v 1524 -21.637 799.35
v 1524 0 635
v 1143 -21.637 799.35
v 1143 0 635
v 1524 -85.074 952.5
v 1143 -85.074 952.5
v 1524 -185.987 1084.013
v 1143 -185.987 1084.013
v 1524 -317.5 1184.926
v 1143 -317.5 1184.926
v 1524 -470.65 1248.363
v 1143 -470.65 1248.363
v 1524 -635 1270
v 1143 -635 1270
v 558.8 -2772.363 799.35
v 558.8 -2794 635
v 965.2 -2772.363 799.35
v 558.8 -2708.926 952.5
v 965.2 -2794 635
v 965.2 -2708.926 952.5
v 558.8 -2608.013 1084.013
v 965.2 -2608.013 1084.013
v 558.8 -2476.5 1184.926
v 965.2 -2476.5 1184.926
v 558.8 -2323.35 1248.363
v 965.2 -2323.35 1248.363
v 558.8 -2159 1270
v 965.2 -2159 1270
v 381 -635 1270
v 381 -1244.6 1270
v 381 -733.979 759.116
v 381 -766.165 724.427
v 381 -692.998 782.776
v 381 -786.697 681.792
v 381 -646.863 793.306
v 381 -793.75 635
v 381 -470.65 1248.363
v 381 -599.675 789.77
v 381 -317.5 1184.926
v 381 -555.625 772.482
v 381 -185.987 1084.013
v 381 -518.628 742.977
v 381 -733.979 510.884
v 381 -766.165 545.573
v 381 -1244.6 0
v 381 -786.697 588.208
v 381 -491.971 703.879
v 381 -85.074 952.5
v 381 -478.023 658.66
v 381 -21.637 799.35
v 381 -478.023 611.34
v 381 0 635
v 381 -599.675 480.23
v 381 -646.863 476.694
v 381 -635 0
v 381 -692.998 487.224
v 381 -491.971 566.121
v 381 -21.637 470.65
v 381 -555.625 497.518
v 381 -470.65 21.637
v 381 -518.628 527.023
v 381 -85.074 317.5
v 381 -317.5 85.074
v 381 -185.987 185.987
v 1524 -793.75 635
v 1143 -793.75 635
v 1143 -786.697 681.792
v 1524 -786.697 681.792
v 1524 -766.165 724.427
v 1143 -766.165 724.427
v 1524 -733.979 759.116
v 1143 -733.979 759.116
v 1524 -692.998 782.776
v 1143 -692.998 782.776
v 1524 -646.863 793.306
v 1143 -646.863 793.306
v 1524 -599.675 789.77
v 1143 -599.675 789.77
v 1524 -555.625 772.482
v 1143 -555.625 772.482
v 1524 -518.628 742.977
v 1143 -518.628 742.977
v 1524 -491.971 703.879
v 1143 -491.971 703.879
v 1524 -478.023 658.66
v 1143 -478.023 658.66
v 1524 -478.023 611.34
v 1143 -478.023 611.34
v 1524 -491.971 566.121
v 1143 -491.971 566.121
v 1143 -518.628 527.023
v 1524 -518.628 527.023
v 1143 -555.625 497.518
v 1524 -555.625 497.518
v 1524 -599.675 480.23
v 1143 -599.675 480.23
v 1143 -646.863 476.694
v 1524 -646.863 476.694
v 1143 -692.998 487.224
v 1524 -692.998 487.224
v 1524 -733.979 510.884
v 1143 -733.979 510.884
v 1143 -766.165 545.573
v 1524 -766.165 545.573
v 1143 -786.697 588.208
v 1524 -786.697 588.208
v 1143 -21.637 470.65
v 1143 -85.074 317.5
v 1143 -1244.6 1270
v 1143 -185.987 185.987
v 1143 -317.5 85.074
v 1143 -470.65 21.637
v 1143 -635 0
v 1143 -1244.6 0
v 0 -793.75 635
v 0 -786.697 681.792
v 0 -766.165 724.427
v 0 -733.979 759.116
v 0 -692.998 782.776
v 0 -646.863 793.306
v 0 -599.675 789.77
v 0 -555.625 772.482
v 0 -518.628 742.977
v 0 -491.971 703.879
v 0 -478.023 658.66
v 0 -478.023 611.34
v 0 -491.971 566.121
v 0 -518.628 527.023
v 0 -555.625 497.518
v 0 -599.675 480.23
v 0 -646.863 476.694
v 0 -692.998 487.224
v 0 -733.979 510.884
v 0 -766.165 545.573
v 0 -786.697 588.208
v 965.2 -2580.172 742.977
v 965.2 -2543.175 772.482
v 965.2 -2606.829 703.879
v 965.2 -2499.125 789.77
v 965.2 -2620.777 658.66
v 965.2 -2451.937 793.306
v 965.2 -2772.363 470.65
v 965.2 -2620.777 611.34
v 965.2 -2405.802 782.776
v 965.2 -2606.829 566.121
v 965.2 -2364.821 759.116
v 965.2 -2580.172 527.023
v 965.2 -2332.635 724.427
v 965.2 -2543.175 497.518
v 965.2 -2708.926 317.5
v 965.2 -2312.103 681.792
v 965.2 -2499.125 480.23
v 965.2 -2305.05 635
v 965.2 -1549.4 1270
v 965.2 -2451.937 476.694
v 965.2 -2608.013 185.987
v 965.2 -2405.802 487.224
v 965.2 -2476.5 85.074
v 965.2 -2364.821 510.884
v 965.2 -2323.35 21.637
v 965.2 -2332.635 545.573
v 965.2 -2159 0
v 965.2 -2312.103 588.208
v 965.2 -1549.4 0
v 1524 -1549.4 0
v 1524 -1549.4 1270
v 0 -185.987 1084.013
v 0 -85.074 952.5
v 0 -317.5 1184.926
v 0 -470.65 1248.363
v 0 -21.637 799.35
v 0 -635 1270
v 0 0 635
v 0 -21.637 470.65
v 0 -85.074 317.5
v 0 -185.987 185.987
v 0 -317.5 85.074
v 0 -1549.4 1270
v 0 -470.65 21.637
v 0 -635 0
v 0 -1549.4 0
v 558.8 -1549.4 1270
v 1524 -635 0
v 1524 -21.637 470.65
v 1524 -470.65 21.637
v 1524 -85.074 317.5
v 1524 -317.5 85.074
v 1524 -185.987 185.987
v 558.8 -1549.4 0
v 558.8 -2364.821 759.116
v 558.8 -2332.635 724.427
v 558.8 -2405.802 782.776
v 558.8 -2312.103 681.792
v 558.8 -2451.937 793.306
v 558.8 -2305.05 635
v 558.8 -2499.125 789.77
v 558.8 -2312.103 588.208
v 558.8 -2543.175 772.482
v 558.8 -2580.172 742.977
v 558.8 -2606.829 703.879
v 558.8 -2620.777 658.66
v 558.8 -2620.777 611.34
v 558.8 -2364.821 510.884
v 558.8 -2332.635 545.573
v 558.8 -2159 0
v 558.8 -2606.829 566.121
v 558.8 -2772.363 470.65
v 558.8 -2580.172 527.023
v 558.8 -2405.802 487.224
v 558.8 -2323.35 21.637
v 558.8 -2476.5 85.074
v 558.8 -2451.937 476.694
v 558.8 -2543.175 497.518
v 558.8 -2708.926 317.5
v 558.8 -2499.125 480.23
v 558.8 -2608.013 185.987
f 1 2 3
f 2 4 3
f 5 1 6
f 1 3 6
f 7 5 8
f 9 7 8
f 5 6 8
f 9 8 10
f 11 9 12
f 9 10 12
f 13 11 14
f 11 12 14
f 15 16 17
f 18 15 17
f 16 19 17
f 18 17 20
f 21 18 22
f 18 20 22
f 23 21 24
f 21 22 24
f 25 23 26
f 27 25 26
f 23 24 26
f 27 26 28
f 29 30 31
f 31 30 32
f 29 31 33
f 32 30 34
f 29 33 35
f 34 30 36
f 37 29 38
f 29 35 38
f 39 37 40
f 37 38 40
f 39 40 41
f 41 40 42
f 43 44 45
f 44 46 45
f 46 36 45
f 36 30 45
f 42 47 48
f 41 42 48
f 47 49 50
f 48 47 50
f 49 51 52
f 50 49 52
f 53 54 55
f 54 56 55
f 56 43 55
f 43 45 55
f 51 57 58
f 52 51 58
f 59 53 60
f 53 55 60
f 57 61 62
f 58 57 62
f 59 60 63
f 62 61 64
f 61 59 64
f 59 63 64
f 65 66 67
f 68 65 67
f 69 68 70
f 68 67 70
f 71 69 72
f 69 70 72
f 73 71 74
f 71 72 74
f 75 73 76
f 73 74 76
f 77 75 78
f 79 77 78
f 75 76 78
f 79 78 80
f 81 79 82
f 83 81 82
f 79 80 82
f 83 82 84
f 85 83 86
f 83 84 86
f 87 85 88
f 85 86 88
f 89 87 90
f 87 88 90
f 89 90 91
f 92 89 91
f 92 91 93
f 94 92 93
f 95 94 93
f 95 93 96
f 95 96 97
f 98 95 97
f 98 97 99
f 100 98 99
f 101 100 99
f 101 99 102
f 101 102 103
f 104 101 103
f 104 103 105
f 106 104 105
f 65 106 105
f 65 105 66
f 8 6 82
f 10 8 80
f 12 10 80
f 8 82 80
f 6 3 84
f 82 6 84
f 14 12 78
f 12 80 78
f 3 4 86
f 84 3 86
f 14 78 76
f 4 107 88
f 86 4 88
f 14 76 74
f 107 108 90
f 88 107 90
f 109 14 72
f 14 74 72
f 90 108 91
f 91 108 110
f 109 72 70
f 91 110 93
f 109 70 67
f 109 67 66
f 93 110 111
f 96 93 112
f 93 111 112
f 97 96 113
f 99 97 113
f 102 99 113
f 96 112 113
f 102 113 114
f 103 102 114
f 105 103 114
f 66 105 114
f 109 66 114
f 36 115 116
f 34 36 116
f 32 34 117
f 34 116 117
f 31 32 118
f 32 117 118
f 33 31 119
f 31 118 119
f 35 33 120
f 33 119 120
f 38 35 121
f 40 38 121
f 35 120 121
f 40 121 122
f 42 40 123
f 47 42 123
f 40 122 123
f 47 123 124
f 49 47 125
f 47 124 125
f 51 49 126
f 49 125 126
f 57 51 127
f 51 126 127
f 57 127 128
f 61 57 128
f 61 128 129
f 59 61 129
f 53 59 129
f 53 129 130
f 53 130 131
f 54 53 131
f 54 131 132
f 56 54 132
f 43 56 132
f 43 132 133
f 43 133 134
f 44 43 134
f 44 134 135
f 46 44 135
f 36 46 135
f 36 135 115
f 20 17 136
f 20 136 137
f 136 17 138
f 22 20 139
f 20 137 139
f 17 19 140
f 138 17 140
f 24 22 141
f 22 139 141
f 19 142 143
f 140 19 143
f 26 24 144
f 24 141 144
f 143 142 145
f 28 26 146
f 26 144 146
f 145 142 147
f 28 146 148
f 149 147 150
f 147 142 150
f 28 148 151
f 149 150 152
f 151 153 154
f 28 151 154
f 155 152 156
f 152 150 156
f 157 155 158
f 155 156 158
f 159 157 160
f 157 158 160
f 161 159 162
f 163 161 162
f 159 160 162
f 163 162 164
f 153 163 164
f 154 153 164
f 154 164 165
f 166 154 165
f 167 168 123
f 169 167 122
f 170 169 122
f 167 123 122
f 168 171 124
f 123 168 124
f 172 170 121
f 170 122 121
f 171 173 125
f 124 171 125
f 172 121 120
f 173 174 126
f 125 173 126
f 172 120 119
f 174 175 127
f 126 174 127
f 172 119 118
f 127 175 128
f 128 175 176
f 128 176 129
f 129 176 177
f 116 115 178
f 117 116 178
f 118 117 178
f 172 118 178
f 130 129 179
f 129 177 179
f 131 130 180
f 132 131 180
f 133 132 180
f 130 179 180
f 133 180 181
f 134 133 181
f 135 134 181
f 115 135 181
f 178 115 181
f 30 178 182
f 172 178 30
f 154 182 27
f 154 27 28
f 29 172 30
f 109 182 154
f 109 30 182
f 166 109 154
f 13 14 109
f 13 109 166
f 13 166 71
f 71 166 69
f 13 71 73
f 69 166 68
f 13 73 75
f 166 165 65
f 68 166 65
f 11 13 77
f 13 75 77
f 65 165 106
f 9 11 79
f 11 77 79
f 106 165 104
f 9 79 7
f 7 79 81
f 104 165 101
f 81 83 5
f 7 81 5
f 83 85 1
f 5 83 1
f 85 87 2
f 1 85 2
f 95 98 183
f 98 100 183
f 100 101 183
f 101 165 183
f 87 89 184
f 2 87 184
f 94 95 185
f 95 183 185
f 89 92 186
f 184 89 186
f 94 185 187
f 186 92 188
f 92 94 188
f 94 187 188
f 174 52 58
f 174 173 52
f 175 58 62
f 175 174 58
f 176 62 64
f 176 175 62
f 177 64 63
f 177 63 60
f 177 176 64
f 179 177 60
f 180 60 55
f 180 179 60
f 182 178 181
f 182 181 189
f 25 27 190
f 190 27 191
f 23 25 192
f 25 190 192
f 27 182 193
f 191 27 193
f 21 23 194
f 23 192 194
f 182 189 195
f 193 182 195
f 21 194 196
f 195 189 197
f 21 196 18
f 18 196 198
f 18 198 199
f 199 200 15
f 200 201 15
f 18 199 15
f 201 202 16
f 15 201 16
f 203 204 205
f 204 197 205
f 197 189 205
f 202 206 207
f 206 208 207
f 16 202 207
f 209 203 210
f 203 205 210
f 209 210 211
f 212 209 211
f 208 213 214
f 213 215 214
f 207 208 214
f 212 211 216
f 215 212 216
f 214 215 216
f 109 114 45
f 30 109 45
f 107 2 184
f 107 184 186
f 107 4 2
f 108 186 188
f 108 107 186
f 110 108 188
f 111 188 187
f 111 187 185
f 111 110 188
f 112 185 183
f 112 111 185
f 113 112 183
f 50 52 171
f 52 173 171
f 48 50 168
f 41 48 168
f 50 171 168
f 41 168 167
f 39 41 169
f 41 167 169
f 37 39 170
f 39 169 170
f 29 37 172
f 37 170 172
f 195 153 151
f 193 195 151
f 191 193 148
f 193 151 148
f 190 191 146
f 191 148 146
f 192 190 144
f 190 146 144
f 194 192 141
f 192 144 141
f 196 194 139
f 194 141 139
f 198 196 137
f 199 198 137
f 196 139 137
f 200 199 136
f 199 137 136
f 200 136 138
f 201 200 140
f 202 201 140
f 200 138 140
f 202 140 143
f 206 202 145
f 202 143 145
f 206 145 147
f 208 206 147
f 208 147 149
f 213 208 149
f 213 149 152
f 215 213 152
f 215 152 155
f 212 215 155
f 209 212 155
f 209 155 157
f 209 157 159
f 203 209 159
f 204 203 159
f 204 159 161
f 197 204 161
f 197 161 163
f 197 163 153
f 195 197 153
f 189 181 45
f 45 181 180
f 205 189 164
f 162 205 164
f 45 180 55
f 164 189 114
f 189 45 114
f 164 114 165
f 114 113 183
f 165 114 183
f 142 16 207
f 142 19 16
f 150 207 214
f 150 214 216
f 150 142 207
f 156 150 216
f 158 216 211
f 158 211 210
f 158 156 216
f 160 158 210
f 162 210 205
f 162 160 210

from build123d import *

# Parameters (mm, degrees)
F1_DEPTH = 1270
F2_R     = 634.99999
F4_D     = 317.5
F6_D     = 317.5


# Not quite as in the source:
# - a fillet or chamfer is up to 0.001 mm smaller than in the source, because OpenCascade refuses the exact size


with BuildPart() as f1:
    # F0 (on Top) → F1 (new body)
    with BuildSketch(Plane.XY):
        Polygon((381, 0), (0, 0), (0, -1549.4), (558.8, -1549.4), (558.8, -2794), (965.2, -2794), (965.2, -1549.4), (1524, -1549.4), (1524, 0), (1143, 0), (1143, -1244.6), (381, -1244.6), align=None)
    extrude(amount=F1_DEPTH)

    # F2 (radius 635 in the source; OpenCascade refuses exactly that, so slightly less here)
    f2_edges = [f1.edges().sort_by_distance(p)[0] for p in [
        (190.5, 0, 1270),
        (190.5, 0, 0),
        (1333.5, 0, 1270),
        (1333.5, 0, 0),
        (762, -2794, 1270),
        (762, -2794, 0),
    ]]
    fillet(f2_edges, radius=F2_R)

    # F4 (through all)
    with Locations(Plane(origin=(558.8, 0, 0), x_dir=(0, -1, 0), z_dir=(-1, 0, 0))):
        with Locations((2463.8, 635)):
            Hole(F4_D / 2)

    # F6 (through all)
    with Locations(Plane.YZ.offset(1524)):
        with Locations((-635, 635)):
            Hole(F6_D / 2)


solid = f1.part
